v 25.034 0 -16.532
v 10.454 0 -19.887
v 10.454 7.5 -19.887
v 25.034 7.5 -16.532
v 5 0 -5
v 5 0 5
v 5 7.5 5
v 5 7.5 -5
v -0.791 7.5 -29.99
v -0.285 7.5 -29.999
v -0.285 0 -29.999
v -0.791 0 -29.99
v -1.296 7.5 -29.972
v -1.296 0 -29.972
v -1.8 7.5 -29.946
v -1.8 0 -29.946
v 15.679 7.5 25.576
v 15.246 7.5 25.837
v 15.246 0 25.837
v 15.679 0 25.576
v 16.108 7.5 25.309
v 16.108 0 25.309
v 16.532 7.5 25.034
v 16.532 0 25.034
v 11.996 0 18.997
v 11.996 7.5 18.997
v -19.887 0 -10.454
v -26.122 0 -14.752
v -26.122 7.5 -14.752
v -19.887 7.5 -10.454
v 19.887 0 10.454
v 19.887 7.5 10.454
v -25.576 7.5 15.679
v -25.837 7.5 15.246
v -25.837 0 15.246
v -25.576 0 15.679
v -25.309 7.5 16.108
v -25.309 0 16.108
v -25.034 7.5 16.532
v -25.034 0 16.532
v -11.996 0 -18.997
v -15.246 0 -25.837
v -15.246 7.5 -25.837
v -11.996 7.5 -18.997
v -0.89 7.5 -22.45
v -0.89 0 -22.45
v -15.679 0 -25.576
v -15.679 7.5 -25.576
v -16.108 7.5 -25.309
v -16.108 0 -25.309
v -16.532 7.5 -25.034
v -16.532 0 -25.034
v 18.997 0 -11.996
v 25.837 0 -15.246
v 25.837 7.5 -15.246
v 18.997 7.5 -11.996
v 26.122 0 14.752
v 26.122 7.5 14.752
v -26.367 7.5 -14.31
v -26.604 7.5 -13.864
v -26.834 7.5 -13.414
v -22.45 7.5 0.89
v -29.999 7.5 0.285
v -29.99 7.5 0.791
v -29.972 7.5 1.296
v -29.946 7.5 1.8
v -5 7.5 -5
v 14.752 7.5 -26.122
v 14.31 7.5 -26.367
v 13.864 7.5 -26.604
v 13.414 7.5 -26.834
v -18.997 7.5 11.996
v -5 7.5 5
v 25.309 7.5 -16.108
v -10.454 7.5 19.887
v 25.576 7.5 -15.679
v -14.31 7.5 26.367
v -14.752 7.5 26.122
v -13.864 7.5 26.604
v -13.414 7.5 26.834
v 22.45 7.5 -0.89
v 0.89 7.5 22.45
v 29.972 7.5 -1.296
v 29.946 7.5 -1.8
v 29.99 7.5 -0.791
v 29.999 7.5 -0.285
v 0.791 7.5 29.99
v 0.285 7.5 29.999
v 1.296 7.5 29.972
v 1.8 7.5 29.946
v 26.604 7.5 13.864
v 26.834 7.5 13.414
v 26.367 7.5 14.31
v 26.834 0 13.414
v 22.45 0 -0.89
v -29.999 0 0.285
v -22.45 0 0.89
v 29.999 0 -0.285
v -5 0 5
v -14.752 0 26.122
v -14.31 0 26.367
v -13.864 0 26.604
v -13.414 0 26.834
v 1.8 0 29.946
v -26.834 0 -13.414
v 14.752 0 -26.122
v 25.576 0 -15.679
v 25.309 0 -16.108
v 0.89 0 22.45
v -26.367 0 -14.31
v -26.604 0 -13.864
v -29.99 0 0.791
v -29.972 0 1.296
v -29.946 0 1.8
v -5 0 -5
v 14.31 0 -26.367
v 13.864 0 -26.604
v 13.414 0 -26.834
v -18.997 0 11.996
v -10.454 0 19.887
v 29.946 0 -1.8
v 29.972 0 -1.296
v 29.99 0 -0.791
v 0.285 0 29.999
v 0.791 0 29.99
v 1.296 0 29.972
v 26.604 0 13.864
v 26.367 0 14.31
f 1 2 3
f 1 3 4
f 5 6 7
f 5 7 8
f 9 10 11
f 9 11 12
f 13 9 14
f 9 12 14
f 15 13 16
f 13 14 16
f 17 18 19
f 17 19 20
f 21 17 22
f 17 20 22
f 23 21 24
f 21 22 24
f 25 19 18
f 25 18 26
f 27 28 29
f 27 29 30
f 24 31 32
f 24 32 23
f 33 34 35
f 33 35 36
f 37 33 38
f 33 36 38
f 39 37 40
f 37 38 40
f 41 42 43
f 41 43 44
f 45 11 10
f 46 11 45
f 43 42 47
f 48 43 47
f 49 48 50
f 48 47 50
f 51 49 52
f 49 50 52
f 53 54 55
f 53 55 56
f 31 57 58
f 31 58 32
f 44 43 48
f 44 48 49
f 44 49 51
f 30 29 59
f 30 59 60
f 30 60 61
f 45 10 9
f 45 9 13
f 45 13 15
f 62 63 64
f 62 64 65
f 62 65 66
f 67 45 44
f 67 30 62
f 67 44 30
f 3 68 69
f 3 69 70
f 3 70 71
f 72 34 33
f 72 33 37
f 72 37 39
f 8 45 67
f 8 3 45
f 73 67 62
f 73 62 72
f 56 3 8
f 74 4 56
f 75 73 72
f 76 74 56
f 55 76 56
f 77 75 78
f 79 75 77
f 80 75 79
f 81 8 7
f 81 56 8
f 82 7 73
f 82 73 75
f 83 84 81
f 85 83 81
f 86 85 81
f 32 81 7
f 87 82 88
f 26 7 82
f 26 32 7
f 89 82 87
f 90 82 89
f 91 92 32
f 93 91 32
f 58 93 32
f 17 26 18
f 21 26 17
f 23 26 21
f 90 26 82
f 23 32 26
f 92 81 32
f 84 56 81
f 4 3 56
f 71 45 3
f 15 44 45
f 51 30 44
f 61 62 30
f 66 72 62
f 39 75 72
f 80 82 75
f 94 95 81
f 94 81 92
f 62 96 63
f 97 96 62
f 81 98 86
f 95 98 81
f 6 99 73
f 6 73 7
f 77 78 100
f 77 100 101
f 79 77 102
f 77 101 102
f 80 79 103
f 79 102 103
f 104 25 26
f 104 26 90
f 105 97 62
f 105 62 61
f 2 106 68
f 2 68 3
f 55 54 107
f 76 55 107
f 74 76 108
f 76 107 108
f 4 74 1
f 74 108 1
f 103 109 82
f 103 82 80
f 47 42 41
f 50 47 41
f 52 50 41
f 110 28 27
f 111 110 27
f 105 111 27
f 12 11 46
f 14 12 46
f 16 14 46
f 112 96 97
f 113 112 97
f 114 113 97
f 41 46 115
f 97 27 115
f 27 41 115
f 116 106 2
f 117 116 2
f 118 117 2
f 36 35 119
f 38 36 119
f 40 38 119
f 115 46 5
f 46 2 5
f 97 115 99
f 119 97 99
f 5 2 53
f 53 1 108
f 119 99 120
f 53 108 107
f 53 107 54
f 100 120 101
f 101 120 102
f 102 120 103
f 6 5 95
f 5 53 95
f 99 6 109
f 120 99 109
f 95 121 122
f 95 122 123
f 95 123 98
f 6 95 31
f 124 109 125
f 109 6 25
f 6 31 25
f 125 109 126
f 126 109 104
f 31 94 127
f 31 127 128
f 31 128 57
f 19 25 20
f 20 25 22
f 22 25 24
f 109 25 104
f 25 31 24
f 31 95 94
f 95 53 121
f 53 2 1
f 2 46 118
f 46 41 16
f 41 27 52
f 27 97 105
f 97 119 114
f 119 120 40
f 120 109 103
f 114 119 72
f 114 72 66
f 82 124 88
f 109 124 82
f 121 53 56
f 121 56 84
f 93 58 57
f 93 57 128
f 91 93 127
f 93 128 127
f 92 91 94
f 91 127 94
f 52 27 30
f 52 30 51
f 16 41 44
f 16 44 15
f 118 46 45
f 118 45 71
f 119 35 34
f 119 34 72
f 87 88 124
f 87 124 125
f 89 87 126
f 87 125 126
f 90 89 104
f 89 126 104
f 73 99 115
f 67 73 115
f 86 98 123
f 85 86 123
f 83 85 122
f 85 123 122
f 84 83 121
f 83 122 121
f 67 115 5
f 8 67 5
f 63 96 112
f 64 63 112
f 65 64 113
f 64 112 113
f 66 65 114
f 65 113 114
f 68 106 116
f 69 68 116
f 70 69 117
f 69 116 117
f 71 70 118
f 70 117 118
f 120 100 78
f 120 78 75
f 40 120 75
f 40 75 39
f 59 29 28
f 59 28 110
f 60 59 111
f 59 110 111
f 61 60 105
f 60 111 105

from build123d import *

# Parameters (mm, degrees)
SCHIZZO1_R                    = 30
SCHIZZO1_W                    = 10
SCHIZZO1_H                    = 10
ESTRUSIONE_ESTRUSIONE1_DEPTH  = 7.5
TAGLIO_ESTRUSIONE1_DEPTH      = 44.084219849
TAGLIO_ESTRUSIONE1_DEPTH_BACK = 44.084219849


with BuildPart() as part:
    # Schizzo1 → Estrusione-Estrusione1 (new body)
    with BuildSketch(Plane(origin=(0, 0, 0), x_dir=(1, 0, 0), z_dir=(0, 1, 0))):
        with Locations(Location((0, 0, 0), (0, 0, 270))):
            Circle(SCHIZZO1_R)
        Rectangle(SCHIZZO1_W, SCHIZZO1_H, mode=Mode.SUBTRACT)
    extrude(amount=ESTRUSIONE_ESTRUSIONE1_DEPTH)

    # Schizzo2 → Taglio-Estrusione1 (cut, two sides: drawn at the far end of the back side and taken through both)
    with BuildSketch(Plane(origin=(0, 7.5, 0), x_dir=(1, 0, 0), z_dir=(0, 1, 0)).offset(-TAGLIO_ESTRUSIONE1_DEPTH_BACK)):
        with BuildLine():
            Line((-19.887270315, 10.454237391), (-16.532028162, 25.033818024))
            ThreePointArc((-16.532028162, 25.033818024), (-21.93796515, 20.462787813), (-26.122238482, 14.75224243))
            Line((-26.122238482, 14.75224243), (-19.887270315, 10.454237391))
        make_face()
        with BuildLine():
            Line((-22.45, -0.89), (-26.834065376, 13.413908282))
            ThreePointArc((-26.834065376, 13.413908282), (-29.230229034, 6.752311504), (-29.998643344, -0.285302534))
            Line((-29.998643344, -0.285302534), (-22.45, -0.89))
        make_face()
        with BuildLine():
            Line((-18.997270315, -11.995762609), (-29.945936443, -1.800247352))
            ThreePointArc((-29.945936443, -1.800247352), (-28.690276653, -8.76744122), (-25.836935948, -15.246400914))
            Line((-25.836935948, -15.246400914), (-18.997270315, -11.995762609))
        make_face()
        with BuildLine():
            Line((-10.454237391, -19.887270315), (-25.033818024, -16.532028162))
            ThreePointArc((-25.033818024, -16.532028162), (-20.462787813, -21.93796515), (-14.75224243, -26.122238482))
            Line((-14.75224243, -26.122238482), (-10.454237391, -19.887270315))
        make_face()
        with BuildLine():
            ThreePointArc((-13.413908282, -26.834065376), (-6.752311504, -29.230229034), (0.285302534, -29.998643344))
            Line((0.285302534, -29.998643344), (0.89, -22.45))
            Line((0.89, -22.45), (-13.413908282, -26.834065376))
        make_face()
        with BuildLine():
            ThreePointArc((1.800247352, -29.945936443), (8.76744122, -28.690276653), (15.246400914, -25.836935948))
            Line((15.246400914, -25.836935948), (11.995762609, -18.997270315))
            Line((11.995762609, -18.997270315), (1.800247352, -29.945936443))
        make_face()
        with BuildLine():
            ThreePointArc((16.532028162, -25.033818024), (21.93796515, -20.462787813), (26.122238482, -14.75224243))
            Line((26.122238482, -14.75224243), (19.887270315, -10.454237391))
            Line((19.887270315, -10.454237391), (16.532028162, -25.033818024))
        make_face()
        with BuildLine():
            ThreePointArc((30, 0), (29.999660834, 0.14265288), (29.998643344, 0.285302534))
            Line((29.998643344, 0.285302534), (22.45, 0.89))
            Line((22.45, 0.89), (26.834065376, -13.413908282))
            ThreePointArc((26.834065376, -13.413908282), (29.197790681, -6.89122771), (30, 0))
        make_face()
        with BuildLine():
            ThreePointArc((29.945936443, 1.800247352), (28.690276653, 8.76744122), (25.836935948, 15.246400914))
            Line((25.836935948, 15.246400914), (18.997270315, 11.995762609))
            Line((18.997270315, 11.995762609), (29.945936443, 1.800247352))
        make_face()
        with BuildLine():
            Line((14.75224243, 26.122238482), (10.454237391, 19.887270315))
            Line((10.454237391, 19.887270315), (25.033818024, 16.532028162))
            ThreePointArc((25.033818024, 16.532028162), (20.462787813, 21.93796515), (14.75224243, 26.122238482))
        make_face()
        with BuildLine():
            Line((-0.89, 22.45), (13.413908282, 26.834065376))
            ThreePointArc((13.413908282, 26.834065376), (6.752311504, 29.230229034), (-0.285302534, 29.998643344))
            Line((-0.285302534, 29.998643344), (-0.89, 22.45))
        make_face()
        with BuildLine():
            Line((-11.995762609, 18.997270315), (-1.800247352, 29.945936443))
            ThreePointArc((-1.800247352, 29.945936443), (-8.76744122, 28.690276653), (-15.246400914, 25.836935948))
            Line((-15.246400914, 25.836935948), (-11.995762609, 18.997270315))
        make_face()
    extrude(amount=TAGLIO_ESTRUSIONE1_DEPTH + TAGLIO_ESTRUSIONE1_DEPTH_BACK, mode=Mode.SUBTRACT)


solid = part.part
